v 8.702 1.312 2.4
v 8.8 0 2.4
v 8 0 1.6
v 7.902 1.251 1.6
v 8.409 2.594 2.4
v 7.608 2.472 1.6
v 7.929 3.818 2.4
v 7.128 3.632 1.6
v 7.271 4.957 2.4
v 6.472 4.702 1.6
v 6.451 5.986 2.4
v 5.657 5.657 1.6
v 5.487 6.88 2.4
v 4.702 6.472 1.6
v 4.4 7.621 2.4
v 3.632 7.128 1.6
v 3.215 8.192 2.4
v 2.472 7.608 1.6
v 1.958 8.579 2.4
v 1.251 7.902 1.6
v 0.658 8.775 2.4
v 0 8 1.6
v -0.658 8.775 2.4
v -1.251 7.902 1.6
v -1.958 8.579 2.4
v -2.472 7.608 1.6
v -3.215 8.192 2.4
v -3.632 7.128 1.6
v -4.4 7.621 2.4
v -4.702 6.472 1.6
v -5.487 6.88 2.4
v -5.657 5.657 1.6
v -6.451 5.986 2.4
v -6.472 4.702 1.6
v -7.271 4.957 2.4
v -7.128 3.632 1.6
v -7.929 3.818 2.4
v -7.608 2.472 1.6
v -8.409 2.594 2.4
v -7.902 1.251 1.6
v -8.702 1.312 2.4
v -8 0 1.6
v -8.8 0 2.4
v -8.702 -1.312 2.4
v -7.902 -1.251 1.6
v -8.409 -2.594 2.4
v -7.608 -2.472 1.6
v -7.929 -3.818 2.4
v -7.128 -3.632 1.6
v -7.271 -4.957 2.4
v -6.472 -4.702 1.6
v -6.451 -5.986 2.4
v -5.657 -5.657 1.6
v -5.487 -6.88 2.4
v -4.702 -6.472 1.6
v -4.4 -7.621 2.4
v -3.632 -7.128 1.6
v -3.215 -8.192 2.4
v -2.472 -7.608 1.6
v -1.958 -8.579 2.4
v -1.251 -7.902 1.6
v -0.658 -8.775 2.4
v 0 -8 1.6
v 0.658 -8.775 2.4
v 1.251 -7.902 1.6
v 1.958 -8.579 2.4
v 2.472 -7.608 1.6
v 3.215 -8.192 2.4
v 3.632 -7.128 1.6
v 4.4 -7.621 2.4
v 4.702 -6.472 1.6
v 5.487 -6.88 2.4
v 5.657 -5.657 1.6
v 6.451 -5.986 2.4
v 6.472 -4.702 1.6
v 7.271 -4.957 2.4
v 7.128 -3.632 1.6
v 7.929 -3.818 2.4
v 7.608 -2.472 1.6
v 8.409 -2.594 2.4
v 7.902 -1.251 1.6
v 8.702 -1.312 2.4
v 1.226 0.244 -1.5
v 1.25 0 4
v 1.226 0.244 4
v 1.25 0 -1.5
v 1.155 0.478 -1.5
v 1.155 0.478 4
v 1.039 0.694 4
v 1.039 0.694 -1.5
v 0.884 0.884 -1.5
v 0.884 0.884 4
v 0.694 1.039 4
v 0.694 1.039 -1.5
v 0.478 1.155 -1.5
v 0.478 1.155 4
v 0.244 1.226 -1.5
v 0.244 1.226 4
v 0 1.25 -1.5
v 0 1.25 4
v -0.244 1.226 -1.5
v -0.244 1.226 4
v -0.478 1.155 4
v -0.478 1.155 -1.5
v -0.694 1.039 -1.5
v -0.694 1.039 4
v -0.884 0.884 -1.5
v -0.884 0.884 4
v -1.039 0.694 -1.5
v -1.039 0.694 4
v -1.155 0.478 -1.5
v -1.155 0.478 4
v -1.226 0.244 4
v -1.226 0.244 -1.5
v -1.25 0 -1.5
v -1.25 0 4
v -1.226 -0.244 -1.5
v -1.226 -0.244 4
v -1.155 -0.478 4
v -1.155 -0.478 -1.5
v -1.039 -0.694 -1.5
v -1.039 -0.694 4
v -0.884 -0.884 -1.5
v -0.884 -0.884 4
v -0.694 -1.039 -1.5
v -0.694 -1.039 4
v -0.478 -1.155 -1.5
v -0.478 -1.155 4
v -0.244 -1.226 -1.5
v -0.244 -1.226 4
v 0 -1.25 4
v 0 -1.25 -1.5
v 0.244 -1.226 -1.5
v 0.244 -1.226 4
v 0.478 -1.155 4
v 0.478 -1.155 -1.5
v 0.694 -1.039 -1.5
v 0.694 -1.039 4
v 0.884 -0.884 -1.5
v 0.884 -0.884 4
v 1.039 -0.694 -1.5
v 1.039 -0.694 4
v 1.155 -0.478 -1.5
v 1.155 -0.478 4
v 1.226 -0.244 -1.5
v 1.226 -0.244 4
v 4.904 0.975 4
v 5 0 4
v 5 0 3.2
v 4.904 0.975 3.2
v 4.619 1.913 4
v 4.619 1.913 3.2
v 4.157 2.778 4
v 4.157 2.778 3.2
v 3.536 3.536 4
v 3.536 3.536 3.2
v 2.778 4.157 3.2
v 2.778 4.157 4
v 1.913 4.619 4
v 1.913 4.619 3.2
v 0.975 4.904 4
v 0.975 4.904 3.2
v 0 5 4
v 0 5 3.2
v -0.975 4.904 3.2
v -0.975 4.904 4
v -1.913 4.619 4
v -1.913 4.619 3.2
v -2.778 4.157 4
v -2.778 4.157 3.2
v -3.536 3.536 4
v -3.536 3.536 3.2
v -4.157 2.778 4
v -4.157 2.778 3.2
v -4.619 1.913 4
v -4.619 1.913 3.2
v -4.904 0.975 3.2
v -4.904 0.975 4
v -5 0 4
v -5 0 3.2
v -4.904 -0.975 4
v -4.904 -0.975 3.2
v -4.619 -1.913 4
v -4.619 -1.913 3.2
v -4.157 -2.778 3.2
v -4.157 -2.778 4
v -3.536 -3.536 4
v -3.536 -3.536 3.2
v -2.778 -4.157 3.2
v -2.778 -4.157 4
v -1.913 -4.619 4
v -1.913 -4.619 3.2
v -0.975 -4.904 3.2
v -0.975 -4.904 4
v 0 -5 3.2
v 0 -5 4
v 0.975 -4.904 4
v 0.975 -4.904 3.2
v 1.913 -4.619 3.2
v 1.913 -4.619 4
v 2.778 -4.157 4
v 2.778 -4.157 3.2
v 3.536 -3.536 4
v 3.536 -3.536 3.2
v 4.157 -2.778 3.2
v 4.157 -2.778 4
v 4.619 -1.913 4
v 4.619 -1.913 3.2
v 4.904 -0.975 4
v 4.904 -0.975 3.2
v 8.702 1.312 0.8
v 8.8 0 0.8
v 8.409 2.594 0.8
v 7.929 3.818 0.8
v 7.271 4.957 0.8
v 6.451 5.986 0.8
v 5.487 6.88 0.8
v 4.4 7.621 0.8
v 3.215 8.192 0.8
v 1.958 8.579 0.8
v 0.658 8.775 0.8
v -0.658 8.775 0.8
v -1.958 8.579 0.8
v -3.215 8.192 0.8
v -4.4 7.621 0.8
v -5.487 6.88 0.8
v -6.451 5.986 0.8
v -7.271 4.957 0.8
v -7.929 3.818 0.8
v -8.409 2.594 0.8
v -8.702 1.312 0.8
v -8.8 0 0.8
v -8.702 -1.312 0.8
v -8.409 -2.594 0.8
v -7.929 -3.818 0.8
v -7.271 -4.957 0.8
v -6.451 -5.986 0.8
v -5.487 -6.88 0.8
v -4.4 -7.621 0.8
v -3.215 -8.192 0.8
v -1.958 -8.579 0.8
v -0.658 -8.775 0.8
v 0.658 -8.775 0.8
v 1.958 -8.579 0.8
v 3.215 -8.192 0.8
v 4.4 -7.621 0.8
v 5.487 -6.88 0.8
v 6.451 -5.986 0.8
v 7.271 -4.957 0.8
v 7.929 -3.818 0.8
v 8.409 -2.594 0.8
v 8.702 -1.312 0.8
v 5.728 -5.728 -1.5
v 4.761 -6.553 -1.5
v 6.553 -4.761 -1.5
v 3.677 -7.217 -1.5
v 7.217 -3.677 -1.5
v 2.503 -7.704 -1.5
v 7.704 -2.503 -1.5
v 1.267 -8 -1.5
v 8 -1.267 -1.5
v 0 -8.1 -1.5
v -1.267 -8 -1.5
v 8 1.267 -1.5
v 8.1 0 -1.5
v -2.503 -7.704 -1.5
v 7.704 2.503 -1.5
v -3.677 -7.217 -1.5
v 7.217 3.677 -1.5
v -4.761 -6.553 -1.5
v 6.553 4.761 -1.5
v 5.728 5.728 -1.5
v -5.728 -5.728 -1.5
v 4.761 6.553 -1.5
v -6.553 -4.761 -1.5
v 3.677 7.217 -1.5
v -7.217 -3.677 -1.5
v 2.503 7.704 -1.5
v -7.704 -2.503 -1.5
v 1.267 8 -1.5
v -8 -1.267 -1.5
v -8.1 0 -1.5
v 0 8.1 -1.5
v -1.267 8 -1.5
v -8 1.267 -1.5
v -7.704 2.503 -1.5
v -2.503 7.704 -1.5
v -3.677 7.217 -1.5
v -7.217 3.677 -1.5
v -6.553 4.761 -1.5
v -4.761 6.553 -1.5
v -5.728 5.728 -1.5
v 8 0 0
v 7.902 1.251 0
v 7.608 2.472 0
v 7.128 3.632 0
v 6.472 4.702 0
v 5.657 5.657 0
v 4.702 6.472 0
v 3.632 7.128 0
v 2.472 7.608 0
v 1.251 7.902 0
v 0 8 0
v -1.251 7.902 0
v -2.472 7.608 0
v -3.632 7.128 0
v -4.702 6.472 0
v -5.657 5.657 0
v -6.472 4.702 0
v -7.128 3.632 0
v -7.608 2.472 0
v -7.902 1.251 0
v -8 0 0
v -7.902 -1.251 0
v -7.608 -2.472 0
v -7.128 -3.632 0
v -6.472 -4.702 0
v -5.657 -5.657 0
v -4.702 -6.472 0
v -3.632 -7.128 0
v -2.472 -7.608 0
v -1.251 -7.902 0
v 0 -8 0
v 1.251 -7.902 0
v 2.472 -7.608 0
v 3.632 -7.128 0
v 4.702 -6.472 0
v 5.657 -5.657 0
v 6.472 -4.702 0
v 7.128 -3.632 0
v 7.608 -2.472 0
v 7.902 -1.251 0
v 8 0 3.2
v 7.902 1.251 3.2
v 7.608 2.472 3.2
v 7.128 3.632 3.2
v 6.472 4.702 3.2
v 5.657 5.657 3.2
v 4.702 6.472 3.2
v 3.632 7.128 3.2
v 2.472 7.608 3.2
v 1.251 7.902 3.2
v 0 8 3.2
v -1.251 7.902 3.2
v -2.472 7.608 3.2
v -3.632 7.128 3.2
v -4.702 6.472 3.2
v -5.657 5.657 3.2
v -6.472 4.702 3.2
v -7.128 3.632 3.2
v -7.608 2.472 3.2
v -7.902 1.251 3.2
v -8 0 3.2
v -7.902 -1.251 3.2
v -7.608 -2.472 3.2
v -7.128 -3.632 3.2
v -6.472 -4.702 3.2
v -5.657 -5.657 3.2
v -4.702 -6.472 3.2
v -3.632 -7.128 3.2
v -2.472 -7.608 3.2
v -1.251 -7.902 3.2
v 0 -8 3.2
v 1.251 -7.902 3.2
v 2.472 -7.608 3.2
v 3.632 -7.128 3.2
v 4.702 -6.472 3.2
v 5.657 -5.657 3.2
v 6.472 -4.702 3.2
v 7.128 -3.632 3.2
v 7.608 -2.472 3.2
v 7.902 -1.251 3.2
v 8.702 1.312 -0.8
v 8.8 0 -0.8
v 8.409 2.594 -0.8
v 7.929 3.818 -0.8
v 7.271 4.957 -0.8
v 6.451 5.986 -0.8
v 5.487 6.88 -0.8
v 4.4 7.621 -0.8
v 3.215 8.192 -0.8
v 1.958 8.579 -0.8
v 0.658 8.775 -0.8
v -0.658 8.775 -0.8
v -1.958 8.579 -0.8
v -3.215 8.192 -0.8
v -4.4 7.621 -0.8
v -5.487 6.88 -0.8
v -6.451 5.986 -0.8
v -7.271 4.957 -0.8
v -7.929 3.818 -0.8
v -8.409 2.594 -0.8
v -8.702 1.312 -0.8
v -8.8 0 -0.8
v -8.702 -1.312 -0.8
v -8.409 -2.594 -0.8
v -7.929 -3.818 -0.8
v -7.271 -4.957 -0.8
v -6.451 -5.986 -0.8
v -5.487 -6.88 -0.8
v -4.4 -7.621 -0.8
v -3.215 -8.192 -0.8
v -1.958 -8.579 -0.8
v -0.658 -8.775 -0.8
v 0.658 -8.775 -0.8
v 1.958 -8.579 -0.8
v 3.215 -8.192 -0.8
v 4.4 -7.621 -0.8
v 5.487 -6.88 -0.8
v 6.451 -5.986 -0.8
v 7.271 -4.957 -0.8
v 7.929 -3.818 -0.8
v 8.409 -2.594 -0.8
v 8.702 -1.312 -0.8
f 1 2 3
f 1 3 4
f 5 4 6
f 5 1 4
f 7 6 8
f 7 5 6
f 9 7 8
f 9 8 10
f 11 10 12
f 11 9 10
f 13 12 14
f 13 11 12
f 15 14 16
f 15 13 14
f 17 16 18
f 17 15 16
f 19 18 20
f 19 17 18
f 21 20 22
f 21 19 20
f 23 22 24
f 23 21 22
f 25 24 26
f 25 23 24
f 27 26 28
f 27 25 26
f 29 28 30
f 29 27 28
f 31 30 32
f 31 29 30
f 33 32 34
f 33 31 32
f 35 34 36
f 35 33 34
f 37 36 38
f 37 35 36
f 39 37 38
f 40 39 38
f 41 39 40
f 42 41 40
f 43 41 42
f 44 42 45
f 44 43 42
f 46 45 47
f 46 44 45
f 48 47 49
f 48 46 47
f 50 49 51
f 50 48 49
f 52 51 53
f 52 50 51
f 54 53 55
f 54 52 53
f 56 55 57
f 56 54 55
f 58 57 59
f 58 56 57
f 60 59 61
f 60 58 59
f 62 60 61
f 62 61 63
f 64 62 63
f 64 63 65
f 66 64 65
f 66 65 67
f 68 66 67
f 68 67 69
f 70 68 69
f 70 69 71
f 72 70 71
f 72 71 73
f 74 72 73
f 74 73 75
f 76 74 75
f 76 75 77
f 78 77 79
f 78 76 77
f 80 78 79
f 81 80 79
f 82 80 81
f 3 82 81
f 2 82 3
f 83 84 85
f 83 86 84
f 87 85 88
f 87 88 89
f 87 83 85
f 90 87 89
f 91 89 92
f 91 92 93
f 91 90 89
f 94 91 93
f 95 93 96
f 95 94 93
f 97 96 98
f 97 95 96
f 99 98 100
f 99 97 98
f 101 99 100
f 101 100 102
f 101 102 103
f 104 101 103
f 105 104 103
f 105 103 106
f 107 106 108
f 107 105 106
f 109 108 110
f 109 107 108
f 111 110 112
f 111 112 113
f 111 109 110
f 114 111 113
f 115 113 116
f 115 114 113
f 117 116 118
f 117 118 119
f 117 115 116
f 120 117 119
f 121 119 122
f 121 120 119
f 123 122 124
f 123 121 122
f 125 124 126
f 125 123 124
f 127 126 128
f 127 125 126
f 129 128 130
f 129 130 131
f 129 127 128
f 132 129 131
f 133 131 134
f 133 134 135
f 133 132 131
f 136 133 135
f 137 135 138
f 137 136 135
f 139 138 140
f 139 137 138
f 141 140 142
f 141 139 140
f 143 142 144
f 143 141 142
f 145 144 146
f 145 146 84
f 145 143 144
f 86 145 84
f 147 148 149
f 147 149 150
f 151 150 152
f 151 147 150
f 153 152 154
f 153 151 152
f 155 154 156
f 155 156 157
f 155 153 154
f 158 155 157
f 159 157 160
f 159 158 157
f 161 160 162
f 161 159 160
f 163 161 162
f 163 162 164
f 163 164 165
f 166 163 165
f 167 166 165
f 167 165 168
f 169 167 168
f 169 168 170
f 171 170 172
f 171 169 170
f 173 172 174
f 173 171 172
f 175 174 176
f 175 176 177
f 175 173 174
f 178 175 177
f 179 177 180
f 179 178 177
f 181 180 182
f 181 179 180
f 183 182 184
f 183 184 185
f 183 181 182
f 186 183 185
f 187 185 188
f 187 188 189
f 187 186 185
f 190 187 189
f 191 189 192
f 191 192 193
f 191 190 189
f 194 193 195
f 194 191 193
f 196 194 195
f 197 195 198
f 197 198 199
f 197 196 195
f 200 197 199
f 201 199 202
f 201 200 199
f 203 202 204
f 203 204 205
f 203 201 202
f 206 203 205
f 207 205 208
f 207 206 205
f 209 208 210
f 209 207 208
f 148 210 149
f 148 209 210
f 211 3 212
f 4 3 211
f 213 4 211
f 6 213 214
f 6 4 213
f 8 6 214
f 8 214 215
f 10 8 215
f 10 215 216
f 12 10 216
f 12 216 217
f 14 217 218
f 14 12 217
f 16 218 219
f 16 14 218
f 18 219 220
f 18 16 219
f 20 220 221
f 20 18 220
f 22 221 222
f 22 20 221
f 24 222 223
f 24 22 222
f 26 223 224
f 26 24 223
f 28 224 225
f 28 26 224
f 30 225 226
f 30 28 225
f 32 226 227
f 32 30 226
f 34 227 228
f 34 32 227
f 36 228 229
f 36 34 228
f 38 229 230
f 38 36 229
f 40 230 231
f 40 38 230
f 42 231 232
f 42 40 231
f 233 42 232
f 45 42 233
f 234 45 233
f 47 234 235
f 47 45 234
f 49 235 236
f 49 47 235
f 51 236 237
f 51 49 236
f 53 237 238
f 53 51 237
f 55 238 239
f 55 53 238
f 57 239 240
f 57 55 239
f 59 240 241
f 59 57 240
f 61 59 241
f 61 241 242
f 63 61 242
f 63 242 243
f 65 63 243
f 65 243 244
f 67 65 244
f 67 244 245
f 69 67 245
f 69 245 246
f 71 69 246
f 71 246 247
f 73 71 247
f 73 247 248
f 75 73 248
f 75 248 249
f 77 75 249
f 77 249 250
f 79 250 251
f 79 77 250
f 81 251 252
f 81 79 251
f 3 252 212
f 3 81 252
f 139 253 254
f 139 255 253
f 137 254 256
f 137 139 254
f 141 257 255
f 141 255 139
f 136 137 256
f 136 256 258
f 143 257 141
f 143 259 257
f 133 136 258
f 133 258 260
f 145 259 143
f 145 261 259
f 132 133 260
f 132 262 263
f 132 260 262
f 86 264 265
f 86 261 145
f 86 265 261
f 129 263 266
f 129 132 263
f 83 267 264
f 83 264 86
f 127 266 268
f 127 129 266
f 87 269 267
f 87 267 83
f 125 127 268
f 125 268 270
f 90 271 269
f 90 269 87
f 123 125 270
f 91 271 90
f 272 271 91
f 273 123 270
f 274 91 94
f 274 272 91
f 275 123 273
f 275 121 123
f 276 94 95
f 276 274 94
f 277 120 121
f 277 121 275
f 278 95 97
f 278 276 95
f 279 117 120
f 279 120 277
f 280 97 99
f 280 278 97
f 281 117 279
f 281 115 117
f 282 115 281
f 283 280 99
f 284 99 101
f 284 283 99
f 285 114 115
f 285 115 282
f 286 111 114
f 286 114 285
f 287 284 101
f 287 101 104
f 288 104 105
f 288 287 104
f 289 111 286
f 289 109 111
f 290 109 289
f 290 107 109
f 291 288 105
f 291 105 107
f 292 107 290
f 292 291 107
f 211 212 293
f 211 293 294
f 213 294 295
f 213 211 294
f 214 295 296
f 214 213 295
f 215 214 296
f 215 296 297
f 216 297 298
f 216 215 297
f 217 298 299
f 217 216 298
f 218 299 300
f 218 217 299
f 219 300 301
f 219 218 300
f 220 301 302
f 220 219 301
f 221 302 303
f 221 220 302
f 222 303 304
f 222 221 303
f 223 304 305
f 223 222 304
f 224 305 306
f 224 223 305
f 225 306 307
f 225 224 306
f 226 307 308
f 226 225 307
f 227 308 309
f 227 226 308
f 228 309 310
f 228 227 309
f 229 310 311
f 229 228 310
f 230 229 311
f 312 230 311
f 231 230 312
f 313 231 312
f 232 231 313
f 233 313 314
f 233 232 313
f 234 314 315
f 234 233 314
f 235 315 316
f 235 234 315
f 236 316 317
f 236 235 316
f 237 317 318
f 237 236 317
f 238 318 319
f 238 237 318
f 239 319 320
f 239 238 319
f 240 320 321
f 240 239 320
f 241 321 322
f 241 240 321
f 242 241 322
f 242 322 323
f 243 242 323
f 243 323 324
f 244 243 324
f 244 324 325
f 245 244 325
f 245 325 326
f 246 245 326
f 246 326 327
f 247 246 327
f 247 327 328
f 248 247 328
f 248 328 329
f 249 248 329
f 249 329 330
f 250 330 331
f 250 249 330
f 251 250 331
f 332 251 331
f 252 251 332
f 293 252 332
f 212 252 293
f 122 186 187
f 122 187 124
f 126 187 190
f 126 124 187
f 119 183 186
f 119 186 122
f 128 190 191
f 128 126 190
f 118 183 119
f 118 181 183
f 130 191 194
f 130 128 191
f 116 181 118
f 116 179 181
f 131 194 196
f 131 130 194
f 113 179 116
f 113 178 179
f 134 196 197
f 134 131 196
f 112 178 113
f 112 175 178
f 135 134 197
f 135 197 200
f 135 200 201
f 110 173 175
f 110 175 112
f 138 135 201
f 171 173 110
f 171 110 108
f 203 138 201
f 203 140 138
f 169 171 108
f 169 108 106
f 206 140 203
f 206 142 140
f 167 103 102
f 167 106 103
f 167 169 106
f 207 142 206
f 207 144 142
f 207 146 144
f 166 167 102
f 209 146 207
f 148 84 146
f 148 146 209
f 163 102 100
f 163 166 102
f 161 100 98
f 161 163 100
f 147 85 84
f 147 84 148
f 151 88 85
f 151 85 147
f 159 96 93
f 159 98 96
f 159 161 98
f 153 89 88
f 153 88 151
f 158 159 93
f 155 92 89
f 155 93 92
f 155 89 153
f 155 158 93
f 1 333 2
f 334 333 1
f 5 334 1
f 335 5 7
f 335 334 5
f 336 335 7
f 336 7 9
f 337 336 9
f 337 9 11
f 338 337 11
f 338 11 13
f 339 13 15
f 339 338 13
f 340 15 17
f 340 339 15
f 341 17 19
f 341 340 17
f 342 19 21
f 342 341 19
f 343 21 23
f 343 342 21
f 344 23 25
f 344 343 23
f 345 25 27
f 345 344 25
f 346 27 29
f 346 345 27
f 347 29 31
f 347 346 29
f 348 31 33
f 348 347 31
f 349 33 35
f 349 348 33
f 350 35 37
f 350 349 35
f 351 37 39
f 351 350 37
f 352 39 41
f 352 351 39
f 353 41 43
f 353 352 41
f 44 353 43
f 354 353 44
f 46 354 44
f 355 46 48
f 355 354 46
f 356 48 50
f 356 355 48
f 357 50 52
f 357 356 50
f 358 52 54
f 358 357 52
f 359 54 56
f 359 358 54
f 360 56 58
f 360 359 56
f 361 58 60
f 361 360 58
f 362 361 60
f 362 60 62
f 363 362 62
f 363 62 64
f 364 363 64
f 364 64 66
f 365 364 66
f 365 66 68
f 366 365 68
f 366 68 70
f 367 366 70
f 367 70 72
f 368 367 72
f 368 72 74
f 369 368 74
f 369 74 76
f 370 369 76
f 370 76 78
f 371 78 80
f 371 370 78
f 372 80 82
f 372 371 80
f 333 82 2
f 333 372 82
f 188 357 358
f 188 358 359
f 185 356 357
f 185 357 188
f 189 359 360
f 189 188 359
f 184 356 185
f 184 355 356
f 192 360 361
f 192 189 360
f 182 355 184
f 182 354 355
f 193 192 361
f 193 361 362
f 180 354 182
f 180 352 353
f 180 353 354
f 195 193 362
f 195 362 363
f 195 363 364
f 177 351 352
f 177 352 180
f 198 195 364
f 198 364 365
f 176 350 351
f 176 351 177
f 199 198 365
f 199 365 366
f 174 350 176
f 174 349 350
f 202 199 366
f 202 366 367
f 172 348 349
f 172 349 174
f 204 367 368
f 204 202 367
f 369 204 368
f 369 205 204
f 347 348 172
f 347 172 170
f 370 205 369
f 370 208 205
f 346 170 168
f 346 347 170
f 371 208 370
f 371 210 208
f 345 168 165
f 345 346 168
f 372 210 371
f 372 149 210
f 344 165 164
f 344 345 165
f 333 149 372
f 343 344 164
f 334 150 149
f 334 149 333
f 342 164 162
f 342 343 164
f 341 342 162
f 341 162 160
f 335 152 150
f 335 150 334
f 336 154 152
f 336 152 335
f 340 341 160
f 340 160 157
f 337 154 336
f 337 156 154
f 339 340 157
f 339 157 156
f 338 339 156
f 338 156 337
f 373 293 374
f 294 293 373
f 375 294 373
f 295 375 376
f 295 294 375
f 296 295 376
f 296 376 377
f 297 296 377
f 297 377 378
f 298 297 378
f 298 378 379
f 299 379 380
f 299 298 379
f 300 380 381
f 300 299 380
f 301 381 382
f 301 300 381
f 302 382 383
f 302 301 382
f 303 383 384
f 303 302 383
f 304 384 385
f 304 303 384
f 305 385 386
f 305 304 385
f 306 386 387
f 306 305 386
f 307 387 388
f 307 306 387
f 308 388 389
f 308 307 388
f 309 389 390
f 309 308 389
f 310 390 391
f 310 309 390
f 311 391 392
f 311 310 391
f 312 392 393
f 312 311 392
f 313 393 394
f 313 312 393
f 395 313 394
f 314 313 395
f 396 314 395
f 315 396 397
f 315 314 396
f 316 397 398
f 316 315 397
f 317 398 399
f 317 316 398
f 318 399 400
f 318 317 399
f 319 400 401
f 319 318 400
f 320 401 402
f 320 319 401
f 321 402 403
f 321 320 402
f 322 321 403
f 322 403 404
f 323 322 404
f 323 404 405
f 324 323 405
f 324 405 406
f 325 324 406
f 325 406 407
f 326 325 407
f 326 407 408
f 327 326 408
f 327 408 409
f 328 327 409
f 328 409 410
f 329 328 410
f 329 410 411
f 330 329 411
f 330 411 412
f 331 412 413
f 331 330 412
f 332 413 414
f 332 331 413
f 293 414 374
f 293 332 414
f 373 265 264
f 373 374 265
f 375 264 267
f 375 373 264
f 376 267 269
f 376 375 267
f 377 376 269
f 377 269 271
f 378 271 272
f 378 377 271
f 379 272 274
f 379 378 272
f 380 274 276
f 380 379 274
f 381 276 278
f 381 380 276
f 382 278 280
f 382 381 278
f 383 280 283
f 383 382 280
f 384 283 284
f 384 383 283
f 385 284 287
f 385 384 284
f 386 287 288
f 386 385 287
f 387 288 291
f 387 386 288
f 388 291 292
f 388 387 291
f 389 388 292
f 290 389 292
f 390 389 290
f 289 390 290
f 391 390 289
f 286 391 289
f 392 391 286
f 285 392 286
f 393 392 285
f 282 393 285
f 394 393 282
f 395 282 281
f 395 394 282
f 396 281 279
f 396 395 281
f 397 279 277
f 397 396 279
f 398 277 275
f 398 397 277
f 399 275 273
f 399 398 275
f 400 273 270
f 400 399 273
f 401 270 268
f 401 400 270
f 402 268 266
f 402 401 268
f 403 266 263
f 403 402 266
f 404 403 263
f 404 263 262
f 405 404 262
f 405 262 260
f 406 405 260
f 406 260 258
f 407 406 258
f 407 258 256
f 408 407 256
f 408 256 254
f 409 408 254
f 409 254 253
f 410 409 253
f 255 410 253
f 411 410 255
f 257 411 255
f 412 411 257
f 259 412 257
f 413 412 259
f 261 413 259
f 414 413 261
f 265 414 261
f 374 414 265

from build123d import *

# Parameters (mm, degrees)
SKETCH002_W   = 5
SKETCH002_H   = 4.7
ARRAY_Z_COUNT = 6
ARRAY_Z_PITCH = 1.6


with BuildPart() as innergroovedom001:
    # Sketch002 → Revolution002 (revolve)
    with BuildSketch(Plane.XZ):
        with Locations((7.5, 0.85)):
            Rectangle(SKETCH002_W, SKETCH002_H)
    revolve(axis=Axis((0, 0, 0), (0, 0, 1)))


with BuildPart() as innergroovetool:
    # Sketch001 → Revolution001 (revolve)
    with BuildSketch(Plane.XZ):
        Polygon((4, 3.2), (4, 1.6), (8, 1.6), (8.8, 2.4), (8, 3.2), align=None)
    revolve(axis=Axis((0, 0, 0), (0, 0, 1)))

    # Array Z: InnerGrooveTool ×6


with BuildPart() as innergroovetool_1:
    add(innergroovetool.part)
    with Locations(*[(0, 0, -i * ARRAY_Z_PITCH) for i in range(1, ARRAY_Z_COUNT)]):
        add(innergroovetool.part)

    # Common: intersect InnerGrooveDom001
    add(innergroovedom001.part, mode=Mode.INTERSECT)


with BuildPart() as lensfixtemplate:
    # Sketch → Revolution (revolve)
    with BuildSketch(Plane.XZ):
        Polygon((1.25, 4), (1.25, -1.5), (8, -1.5), (8, 3.2), (5, 3.2), (5, 4), align=None)
    revolve(axis=Axis((0, 0, 0), (0, 0, 1)))

    # Fusion001: union InnerGrooveTool
    add(innergroovetool_1.part)


solid = lensfixtemplate.part
